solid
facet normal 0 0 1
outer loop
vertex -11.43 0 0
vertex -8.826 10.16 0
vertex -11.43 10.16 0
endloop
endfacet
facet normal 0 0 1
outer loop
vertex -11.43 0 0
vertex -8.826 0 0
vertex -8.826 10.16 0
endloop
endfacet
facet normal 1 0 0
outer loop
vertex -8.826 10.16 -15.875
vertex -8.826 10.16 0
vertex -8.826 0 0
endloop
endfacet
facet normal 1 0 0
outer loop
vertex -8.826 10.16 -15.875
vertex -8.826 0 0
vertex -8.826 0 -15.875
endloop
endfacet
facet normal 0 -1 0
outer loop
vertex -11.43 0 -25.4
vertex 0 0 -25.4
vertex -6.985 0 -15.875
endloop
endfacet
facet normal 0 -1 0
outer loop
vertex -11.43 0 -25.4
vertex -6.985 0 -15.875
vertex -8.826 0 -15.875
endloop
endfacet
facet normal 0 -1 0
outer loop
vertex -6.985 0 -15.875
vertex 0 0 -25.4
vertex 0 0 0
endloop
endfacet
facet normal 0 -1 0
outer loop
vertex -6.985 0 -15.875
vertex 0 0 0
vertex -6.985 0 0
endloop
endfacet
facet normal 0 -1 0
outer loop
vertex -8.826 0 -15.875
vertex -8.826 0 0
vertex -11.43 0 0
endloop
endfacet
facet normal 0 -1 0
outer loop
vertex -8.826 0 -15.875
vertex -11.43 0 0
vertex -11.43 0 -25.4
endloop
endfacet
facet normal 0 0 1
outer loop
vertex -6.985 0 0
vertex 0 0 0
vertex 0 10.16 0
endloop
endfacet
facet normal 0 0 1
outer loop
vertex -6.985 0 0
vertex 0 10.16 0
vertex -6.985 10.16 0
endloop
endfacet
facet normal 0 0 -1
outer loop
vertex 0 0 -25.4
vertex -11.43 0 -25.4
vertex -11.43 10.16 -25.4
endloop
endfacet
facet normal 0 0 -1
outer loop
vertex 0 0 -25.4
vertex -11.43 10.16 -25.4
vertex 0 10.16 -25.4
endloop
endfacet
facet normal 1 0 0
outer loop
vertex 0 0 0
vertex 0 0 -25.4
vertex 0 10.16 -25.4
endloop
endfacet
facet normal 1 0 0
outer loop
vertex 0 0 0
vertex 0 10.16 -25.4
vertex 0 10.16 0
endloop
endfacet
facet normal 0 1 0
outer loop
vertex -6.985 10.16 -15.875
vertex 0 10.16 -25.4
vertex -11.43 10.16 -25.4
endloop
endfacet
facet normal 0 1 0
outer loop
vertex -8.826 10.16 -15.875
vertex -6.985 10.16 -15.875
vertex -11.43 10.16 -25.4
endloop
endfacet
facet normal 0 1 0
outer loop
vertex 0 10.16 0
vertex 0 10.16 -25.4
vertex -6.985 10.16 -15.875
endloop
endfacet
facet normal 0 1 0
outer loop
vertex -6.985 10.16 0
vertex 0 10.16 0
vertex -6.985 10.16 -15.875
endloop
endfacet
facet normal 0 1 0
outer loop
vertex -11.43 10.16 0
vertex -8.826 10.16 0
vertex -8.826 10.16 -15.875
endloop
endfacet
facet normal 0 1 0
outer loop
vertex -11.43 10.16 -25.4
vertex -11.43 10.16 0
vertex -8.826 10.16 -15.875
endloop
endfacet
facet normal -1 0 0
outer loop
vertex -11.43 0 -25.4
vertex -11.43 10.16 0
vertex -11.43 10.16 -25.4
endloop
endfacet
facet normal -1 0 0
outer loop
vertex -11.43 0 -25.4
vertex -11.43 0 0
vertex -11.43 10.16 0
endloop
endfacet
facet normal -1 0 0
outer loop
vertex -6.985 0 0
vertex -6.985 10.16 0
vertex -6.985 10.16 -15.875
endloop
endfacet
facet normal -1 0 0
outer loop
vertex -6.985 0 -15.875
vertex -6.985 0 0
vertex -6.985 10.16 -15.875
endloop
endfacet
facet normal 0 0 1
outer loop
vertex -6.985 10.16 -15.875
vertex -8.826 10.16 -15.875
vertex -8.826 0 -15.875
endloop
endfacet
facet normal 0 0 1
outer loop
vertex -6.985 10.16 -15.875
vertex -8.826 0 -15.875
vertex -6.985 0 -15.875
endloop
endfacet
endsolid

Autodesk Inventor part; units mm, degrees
ref_plane "YZ Plane" through (0, 0, 0) normal (1, 0, 0) x (0, 1, 0)
ref_plane "XZ Plane" through (0, 0, 0) normal (0, 1, 0) x (-1, 0, 0)
ref_plane "XY Plane" through (0, 0, 0) normal (0, 0, 1) x (1, 0, 0)
sketch "Sketch1" plane through (0, 0, 0) normal (0, 1, 0) x (-1, 0, 0)
  line L0 (0, 0) -> (11.43, 0)
  line L1 (11.43, 0) -> (11.43, -25.4)
  line L2 (11.43, -25.4) -> (0, -25.4)
  line L3 (0, -25.4) -> (0, 0)
  dimension "d0" = 11.43
  dimension "d1" = 25.4
extrude "Extrusion1" add sketch "Sketch1" along normal blind 10.16
sketch "Sketch2" plane through (0, 10.16, 0) normal (0, 1, 0) x (1, 0, 0)
  line L0 (0, 0) -> (0, 25.4) projected
  line L1 (0, 0) -> (-6.985, 0)
  line L2 (-6.985, 0) -> (-6.985, 4.6296)
  line L3 (-6.985, 4.6296) -> (0, 4.6296)
  line L4 (0, 4.6296) -> (0, 0)
  line L5 (-6.985, 0) -> (-8.8265, 0)
  line L6 (-8.8265, 0) -> (-8.8265, 15.875)
  line L7 (-8.8265, 15.875) -> (-6.985, 15.875)
  line L8 (-6.985, 15.875) -> (-6.985, 0)
  dimension "d4" = 6.985
  dimension "d5" = 1.8415
  dimension "d6" = 15.875
extrude "Extrusion2" cut sketch "Sketch2" against normal blind 12.7 contours L5 L6 L7 L8 L2
properties part number "PCB_Holder"
